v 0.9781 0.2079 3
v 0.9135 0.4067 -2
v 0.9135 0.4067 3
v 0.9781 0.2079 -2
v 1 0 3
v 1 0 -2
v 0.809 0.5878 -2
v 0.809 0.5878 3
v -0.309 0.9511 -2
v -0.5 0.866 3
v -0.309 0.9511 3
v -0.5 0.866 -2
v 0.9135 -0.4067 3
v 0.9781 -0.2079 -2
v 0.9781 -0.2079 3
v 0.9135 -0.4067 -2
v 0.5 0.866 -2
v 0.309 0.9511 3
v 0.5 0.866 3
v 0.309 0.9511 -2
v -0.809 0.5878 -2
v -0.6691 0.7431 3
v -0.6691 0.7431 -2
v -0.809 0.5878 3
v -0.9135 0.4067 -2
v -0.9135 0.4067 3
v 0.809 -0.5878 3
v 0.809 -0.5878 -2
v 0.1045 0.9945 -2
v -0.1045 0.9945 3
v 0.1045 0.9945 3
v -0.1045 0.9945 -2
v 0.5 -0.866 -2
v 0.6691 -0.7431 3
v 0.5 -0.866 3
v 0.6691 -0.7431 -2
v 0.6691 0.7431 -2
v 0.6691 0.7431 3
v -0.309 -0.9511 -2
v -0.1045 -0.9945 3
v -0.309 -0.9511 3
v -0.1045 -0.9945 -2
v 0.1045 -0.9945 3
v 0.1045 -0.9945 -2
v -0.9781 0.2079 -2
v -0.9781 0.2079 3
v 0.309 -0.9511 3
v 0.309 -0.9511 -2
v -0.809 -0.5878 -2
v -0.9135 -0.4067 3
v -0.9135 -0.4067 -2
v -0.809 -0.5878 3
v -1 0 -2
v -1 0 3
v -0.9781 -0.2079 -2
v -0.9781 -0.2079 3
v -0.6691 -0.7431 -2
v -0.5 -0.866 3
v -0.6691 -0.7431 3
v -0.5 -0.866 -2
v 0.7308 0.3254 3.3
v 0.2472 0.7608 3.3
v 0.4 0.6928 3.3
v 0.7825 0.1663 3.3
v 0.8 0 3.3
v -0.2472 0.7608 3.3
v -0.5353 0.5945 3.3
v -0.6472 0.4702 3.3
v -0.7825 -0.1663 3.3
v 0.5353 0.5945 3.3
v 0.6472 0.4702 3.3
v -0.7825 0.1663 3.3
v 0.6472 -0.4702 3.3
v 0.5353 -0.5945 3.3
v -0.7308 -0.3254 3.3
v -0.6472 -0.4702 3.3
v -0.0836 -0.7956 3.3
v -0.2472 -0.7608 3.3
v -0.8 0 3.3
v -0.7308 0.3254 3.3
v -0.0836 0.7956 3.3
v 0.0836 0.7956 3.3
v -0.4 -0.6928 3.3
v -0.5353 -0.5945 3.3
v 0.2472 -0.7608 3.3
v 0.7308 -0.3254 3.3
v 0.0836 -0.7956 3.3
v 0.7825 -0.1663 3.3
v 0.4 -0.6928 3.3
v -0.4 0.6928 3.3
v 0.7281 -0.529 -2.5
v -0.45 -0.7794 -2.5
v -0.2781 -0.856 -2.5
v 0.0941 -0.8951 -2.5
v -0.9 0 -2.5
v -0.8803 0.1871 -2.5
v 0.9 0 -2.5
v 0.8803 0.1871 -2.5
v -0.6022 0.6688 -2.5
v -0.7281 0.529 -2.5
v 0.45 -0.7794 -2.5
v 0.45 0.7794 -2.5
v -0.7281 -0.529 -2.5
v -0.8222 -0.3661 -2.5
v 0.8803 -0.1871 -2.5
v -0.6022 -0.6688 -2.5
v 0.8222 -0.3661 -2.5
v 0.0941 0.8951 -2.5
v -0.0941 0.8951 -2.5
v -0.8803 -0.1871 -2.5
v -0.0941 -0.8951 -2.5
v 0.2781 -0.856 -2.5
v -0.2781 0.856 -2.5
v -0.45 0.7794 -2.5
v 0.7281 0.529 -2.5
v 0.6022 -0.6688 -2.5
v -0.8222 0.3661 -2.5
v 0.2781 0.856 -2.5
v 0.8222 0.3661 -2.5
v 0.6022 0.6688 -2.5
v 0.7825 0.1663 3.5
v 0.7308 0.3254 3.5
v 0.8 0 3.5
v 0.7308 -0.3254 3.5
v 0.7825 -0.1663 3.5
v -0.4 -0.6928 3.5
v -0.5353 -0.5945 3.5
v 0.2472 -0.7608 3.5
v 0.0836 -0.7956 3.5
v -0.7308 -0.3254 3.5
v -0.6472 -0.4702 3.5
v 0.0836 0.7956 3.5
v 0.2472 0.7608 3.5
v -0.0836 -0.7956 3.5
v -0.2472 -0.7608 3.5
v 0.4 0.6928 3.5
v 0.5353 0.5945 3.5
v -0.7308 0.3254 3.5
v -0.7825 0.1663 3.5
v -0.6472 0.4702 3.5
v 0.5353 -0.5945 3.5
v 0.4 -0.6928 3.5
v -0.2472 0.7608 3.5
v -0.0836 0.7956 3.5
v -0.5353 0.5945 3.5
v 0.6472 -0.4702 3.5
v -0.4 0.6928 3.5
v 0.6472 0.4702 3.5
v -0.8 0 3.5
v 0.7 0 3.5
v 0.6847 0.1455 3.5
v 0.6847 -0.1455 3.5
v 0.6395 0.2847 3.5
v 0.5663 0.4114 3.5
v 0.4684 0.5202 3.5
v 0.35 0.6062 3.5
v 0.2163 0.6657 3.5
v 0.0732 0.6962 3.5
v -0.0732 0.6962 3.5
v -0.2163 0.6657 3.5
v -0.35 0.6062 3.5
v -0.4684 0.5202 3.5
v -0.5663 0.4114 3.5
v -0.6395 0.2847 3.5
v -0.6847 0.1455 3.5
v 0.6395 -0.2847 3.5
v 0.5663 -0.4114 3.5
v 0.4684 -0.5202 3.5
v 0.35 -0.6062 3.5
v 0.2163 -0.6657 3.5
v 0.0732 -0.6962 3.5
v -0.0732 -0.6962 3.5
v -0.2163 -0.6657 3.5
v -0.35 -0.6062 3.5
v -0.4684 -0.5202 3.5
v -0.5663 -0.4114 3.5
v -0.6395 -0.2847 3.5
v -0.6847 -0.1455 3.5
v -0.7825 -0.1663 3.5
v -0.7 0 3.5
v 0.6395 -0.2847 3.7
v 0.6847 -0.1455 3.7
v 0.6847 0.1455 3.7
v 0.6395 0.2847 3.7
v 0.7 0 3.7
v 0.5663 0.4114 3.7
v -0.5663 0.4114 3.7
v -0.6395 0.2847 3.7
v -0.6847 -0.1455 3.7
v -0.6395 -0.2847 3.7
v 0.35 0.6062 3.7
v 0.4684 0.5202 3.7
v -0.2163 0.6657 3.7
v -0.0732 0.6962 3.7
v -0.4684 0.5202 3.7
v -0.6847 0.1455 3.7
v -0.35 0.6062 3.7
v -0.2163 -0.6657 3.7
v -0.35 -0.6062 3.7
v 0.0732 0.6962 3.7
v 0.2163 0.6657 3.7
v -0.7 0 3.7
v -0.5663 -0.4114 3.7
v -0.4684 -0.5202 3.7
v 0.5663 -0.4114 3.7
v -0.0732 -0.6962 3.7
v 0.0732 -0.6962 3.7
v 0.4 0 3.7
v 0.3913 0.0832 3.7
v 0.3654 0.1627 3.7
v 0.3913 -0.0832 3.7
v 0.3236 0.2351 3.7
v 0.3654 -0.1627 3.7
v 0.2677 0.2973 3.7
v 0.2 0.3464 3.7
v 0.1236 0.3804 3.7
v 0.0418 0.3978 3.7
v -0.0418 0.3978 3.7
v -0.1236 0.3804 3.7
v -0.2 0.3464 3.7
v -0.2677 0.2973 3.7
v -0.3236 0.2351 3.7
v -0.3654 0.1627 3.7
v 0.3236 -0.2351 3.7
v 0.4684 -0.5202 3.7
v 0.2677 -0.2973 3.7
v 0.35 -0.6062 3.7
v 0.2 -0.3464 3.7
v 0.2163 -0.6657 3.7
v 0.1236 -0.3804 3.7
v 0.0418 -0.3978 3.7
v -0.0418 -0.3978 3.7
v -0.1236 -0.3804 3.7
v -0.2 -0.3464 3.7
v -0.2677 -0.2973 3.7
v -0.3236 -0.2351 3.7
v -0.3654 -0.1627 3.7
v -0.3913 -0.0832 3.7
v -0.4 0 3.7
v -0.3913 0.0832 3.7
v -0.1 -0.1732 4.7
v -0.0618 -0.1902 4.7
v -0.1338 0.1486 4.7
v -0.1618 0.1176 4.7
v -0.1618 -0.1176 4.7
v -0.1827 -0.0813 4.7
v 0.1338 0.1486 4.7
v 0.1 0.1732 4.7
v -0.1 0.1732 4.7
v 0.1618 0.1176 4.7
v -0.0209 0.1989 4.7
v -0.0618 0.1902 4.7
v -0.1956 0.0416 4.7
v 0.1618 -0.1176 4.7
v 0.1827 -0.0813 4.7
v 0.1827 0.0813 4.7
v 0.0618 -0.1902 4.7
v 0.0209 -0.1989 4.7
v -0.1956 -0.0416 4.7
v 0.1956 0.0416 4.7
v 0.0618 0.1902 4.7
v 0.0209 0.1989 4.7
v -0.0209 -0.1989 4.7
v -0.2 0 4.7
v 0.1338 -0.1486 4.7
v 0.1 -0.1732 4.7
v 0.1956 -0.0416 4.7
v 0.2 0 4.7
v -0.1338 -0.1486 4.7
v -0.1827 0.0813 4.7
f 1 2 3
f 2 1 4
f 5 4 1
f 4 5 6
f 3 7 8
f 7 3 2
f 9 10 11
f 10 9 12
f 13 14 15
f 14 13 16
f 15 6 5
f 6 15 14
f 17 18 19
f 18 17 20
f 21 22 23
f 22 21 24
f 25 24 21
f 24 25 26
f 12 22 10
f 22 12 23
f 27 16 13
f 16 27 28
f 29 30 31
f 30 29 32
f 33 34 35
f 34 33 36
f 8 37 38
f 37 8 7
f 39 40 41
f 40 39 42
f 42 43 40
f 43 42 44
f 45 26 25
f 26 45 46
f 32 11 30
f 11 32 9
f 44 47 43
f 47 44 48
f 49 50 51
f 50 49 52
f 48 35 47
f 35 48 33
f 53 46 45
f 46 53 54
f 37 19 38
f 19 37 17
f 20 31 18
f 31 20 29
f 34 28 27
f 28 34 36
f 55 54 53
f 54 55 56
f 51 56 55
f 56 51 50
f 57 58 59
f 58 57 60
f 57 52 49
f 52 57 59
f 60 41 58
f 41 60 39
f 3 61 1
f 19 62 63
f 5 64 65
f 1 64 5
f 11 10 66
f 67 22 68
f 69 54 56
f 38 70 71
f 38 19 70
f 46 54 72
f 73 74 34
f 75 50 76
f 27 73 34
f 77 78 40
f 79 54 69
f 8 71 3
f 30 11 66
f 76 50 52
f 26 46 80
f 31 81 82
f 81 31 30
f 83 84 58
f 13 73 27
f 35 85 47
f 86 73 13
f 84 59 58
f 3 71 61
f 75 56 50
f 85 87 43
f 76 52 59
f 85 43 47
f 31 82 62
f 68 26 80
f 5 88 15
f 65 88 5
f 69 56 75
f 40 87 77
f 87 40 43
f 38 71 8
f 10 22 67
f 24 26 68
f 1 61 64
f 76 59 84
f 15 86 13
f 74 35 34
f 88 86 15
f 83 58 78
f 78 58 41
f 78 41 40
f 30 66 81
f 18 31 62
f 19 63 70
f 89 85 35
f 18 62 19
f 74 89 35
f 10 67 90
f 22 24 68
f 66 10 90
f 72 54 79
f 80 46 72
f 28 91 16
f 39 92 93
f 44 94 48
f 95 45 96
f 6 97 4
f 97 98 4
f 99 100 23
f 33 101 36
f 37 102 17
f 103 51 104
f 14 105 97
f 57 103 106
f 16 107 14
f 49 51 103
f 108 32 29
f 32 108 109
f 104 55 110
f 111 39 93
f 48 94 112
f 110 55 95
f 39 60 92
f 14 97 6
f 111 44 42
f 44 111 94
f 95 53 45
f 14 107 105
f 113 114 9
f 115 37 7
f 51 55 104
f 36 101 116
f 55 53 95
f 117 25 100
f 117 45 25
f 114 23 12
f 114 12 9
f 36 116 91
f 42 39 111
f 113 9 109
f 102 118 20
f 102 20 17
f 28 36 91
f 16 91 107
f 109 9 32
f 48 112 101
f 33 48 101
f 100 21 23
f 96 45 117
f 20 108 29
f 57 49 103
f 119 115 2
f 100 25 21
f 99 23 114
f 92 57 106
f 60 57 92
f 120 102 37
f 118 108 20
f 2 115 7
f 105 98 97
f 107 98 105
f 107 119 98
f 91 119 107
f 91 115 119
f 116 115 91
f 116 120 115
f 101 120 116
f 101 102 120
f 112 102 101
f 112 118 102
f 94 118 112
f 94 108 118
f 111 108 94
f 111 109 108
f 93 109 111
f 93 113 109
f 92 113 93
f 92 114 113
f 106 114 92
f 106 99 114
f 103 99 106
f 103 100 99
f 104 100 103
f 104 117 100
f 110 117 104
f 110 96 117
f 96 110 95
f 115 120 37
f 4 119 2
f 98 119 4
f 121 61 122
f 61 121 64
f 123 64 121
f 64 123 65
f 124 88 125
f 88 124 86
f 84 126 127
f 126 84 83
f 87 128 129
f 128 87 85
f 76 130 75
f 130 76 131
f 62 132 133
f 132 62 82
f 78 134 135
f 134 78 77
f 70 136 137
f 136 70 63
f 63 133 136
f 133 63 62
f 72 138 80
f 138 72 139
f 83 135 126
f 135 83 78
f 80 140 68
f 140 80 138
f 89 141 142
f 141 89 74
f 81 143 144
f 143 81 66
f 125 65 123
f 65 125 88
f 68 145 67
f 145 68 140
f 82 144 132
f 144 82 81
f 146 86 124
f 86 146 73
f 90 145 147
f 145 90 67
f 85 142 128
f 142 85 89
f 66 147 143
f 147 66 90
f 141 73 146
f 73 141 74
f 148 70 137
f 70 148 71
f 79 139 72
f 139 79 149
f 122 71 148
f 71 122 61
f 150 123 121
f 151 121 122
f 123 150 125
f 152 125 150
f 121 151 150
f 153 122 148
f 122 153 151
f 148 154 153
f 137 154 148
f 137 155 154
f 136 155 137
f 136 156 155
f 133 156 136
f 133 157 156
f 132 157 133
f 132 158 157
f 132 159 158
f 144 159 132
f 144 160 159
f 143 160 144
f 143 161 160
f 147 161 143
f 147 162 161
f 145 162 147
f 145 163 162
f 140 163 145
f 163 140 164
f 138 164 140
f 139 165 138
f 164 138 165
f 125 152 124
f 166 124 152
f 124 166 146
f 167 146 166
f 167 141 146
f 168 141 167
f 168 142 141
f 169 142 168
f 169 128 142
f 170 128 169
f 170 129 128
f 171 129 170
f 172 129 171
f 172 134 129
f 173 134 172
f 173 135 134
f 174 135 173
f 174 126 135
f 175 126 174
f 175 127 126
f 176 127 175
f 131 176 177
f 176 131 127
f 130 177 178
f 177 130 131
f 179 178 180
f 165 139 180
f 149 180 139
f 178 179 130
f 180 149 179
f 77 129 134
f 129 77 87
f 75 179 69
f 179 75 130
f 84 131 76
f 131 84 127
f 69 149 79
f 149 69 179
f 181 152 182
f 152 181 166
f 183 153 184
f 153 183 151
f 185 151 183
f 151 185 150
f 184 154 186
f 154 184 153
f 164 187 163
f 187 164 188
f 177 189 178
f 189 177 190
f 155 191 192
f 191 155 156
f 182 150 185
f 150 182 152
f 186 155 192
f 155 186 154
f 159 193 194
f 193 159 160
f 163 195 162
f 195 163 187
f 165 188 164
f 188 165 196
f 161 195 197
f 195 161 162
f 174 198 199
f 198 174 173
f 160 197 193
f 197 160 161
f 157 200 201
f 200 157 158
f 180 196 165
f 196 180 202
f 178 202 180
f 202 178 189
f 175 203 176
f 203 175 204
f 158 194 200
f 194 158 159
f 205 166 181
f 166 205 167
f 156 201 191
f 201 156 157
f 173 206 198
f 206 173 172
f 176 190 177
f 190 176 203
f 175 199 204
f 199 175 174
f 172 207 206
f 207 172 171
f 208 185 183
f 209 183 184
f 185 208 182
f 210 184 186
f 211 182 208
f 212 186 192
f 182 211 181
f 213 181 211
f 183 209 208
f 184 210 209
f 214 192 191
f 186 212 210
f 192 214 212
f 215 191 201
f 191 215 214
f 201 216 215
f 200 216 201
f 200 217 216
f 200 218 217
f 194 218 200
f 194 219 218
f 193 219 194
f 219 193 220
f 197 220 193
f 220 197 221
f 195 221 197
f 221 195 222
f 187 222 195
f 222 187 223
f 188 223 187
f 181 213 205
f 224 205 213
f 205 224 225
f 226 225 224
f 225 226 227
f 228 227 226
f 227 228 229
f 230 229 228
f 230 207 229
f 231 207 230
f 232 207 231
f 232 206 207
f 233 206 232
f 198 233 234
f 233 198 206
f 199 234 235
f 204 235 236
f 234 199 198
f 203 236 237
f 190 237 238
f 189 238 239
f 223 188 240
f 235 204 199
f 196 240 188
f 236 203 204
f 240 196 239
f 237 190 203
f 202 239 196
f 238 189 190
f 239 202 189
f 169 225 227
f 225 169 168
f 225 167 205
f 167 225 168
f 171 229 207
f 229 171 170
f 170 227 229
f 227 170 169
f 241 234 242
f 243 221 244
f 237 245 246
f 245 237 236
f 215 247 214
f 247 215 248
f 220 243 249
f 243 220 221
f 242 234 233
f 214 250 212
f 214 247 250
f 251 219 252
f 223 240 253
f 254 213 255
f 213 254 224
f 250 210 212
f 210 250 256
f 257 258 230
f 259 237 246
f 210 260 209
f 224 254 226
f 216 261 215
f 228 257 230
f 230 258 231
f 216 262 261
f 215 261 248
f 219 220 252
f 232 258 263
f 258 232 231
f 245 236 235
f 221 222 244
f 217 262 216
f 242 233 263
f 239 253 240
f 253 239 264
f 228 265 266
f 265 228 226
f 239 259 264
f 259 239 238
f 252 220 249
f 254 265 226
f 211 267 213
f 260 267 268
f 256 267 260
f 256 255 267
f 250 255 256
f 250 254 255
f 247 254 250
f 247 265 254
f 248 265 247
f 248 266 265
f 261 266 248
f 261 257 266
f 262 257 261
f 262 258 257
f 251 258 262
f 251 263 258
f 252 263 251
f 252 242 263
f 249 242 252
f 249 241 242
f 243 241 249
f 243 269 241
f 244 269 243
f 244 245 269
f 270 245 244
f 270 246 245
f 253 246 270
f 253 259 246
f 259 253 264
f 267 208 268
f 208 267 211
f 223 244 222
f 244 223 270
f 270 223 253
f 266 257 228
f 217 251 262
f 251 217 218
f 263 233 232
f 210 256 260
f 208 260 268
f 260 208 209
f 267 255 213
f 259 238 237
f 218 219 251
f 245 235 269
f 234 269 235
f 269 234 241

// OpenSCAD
module Sauce_Mustard(){

color("#e5c54f"){
// color("#ec0606"){
translate([0,0,0.5])
cylinder(5, 1,1, $fn = 30, center = true);
}


color("#e5c54f"){
//color("#ec0606"){
translate([0,0,3])
cylinder(0.3, 1,0.8, $fn = 30);
}

color("#e5c54f"){
//color("#ec0606"){
translate([0,0,-2.5])
cylinder(0.5,0.9,1, $fn = 30);
}


color("#f9f2f2"){
translate([0,0,3.3])
cylinder(0.2, 0.8,0.8, $fn = 30);
}


color("#f9f2f2"){
translate([0,0,3.5])
cylinder(0.2, 0.7,0.7, $fn = 30);
}


color("#f9f2f2"){
translate([0,0,3.7])
cylinder(1, 0.4,0.2, $fn = 30);
}

}

Sauce_Mustard();
